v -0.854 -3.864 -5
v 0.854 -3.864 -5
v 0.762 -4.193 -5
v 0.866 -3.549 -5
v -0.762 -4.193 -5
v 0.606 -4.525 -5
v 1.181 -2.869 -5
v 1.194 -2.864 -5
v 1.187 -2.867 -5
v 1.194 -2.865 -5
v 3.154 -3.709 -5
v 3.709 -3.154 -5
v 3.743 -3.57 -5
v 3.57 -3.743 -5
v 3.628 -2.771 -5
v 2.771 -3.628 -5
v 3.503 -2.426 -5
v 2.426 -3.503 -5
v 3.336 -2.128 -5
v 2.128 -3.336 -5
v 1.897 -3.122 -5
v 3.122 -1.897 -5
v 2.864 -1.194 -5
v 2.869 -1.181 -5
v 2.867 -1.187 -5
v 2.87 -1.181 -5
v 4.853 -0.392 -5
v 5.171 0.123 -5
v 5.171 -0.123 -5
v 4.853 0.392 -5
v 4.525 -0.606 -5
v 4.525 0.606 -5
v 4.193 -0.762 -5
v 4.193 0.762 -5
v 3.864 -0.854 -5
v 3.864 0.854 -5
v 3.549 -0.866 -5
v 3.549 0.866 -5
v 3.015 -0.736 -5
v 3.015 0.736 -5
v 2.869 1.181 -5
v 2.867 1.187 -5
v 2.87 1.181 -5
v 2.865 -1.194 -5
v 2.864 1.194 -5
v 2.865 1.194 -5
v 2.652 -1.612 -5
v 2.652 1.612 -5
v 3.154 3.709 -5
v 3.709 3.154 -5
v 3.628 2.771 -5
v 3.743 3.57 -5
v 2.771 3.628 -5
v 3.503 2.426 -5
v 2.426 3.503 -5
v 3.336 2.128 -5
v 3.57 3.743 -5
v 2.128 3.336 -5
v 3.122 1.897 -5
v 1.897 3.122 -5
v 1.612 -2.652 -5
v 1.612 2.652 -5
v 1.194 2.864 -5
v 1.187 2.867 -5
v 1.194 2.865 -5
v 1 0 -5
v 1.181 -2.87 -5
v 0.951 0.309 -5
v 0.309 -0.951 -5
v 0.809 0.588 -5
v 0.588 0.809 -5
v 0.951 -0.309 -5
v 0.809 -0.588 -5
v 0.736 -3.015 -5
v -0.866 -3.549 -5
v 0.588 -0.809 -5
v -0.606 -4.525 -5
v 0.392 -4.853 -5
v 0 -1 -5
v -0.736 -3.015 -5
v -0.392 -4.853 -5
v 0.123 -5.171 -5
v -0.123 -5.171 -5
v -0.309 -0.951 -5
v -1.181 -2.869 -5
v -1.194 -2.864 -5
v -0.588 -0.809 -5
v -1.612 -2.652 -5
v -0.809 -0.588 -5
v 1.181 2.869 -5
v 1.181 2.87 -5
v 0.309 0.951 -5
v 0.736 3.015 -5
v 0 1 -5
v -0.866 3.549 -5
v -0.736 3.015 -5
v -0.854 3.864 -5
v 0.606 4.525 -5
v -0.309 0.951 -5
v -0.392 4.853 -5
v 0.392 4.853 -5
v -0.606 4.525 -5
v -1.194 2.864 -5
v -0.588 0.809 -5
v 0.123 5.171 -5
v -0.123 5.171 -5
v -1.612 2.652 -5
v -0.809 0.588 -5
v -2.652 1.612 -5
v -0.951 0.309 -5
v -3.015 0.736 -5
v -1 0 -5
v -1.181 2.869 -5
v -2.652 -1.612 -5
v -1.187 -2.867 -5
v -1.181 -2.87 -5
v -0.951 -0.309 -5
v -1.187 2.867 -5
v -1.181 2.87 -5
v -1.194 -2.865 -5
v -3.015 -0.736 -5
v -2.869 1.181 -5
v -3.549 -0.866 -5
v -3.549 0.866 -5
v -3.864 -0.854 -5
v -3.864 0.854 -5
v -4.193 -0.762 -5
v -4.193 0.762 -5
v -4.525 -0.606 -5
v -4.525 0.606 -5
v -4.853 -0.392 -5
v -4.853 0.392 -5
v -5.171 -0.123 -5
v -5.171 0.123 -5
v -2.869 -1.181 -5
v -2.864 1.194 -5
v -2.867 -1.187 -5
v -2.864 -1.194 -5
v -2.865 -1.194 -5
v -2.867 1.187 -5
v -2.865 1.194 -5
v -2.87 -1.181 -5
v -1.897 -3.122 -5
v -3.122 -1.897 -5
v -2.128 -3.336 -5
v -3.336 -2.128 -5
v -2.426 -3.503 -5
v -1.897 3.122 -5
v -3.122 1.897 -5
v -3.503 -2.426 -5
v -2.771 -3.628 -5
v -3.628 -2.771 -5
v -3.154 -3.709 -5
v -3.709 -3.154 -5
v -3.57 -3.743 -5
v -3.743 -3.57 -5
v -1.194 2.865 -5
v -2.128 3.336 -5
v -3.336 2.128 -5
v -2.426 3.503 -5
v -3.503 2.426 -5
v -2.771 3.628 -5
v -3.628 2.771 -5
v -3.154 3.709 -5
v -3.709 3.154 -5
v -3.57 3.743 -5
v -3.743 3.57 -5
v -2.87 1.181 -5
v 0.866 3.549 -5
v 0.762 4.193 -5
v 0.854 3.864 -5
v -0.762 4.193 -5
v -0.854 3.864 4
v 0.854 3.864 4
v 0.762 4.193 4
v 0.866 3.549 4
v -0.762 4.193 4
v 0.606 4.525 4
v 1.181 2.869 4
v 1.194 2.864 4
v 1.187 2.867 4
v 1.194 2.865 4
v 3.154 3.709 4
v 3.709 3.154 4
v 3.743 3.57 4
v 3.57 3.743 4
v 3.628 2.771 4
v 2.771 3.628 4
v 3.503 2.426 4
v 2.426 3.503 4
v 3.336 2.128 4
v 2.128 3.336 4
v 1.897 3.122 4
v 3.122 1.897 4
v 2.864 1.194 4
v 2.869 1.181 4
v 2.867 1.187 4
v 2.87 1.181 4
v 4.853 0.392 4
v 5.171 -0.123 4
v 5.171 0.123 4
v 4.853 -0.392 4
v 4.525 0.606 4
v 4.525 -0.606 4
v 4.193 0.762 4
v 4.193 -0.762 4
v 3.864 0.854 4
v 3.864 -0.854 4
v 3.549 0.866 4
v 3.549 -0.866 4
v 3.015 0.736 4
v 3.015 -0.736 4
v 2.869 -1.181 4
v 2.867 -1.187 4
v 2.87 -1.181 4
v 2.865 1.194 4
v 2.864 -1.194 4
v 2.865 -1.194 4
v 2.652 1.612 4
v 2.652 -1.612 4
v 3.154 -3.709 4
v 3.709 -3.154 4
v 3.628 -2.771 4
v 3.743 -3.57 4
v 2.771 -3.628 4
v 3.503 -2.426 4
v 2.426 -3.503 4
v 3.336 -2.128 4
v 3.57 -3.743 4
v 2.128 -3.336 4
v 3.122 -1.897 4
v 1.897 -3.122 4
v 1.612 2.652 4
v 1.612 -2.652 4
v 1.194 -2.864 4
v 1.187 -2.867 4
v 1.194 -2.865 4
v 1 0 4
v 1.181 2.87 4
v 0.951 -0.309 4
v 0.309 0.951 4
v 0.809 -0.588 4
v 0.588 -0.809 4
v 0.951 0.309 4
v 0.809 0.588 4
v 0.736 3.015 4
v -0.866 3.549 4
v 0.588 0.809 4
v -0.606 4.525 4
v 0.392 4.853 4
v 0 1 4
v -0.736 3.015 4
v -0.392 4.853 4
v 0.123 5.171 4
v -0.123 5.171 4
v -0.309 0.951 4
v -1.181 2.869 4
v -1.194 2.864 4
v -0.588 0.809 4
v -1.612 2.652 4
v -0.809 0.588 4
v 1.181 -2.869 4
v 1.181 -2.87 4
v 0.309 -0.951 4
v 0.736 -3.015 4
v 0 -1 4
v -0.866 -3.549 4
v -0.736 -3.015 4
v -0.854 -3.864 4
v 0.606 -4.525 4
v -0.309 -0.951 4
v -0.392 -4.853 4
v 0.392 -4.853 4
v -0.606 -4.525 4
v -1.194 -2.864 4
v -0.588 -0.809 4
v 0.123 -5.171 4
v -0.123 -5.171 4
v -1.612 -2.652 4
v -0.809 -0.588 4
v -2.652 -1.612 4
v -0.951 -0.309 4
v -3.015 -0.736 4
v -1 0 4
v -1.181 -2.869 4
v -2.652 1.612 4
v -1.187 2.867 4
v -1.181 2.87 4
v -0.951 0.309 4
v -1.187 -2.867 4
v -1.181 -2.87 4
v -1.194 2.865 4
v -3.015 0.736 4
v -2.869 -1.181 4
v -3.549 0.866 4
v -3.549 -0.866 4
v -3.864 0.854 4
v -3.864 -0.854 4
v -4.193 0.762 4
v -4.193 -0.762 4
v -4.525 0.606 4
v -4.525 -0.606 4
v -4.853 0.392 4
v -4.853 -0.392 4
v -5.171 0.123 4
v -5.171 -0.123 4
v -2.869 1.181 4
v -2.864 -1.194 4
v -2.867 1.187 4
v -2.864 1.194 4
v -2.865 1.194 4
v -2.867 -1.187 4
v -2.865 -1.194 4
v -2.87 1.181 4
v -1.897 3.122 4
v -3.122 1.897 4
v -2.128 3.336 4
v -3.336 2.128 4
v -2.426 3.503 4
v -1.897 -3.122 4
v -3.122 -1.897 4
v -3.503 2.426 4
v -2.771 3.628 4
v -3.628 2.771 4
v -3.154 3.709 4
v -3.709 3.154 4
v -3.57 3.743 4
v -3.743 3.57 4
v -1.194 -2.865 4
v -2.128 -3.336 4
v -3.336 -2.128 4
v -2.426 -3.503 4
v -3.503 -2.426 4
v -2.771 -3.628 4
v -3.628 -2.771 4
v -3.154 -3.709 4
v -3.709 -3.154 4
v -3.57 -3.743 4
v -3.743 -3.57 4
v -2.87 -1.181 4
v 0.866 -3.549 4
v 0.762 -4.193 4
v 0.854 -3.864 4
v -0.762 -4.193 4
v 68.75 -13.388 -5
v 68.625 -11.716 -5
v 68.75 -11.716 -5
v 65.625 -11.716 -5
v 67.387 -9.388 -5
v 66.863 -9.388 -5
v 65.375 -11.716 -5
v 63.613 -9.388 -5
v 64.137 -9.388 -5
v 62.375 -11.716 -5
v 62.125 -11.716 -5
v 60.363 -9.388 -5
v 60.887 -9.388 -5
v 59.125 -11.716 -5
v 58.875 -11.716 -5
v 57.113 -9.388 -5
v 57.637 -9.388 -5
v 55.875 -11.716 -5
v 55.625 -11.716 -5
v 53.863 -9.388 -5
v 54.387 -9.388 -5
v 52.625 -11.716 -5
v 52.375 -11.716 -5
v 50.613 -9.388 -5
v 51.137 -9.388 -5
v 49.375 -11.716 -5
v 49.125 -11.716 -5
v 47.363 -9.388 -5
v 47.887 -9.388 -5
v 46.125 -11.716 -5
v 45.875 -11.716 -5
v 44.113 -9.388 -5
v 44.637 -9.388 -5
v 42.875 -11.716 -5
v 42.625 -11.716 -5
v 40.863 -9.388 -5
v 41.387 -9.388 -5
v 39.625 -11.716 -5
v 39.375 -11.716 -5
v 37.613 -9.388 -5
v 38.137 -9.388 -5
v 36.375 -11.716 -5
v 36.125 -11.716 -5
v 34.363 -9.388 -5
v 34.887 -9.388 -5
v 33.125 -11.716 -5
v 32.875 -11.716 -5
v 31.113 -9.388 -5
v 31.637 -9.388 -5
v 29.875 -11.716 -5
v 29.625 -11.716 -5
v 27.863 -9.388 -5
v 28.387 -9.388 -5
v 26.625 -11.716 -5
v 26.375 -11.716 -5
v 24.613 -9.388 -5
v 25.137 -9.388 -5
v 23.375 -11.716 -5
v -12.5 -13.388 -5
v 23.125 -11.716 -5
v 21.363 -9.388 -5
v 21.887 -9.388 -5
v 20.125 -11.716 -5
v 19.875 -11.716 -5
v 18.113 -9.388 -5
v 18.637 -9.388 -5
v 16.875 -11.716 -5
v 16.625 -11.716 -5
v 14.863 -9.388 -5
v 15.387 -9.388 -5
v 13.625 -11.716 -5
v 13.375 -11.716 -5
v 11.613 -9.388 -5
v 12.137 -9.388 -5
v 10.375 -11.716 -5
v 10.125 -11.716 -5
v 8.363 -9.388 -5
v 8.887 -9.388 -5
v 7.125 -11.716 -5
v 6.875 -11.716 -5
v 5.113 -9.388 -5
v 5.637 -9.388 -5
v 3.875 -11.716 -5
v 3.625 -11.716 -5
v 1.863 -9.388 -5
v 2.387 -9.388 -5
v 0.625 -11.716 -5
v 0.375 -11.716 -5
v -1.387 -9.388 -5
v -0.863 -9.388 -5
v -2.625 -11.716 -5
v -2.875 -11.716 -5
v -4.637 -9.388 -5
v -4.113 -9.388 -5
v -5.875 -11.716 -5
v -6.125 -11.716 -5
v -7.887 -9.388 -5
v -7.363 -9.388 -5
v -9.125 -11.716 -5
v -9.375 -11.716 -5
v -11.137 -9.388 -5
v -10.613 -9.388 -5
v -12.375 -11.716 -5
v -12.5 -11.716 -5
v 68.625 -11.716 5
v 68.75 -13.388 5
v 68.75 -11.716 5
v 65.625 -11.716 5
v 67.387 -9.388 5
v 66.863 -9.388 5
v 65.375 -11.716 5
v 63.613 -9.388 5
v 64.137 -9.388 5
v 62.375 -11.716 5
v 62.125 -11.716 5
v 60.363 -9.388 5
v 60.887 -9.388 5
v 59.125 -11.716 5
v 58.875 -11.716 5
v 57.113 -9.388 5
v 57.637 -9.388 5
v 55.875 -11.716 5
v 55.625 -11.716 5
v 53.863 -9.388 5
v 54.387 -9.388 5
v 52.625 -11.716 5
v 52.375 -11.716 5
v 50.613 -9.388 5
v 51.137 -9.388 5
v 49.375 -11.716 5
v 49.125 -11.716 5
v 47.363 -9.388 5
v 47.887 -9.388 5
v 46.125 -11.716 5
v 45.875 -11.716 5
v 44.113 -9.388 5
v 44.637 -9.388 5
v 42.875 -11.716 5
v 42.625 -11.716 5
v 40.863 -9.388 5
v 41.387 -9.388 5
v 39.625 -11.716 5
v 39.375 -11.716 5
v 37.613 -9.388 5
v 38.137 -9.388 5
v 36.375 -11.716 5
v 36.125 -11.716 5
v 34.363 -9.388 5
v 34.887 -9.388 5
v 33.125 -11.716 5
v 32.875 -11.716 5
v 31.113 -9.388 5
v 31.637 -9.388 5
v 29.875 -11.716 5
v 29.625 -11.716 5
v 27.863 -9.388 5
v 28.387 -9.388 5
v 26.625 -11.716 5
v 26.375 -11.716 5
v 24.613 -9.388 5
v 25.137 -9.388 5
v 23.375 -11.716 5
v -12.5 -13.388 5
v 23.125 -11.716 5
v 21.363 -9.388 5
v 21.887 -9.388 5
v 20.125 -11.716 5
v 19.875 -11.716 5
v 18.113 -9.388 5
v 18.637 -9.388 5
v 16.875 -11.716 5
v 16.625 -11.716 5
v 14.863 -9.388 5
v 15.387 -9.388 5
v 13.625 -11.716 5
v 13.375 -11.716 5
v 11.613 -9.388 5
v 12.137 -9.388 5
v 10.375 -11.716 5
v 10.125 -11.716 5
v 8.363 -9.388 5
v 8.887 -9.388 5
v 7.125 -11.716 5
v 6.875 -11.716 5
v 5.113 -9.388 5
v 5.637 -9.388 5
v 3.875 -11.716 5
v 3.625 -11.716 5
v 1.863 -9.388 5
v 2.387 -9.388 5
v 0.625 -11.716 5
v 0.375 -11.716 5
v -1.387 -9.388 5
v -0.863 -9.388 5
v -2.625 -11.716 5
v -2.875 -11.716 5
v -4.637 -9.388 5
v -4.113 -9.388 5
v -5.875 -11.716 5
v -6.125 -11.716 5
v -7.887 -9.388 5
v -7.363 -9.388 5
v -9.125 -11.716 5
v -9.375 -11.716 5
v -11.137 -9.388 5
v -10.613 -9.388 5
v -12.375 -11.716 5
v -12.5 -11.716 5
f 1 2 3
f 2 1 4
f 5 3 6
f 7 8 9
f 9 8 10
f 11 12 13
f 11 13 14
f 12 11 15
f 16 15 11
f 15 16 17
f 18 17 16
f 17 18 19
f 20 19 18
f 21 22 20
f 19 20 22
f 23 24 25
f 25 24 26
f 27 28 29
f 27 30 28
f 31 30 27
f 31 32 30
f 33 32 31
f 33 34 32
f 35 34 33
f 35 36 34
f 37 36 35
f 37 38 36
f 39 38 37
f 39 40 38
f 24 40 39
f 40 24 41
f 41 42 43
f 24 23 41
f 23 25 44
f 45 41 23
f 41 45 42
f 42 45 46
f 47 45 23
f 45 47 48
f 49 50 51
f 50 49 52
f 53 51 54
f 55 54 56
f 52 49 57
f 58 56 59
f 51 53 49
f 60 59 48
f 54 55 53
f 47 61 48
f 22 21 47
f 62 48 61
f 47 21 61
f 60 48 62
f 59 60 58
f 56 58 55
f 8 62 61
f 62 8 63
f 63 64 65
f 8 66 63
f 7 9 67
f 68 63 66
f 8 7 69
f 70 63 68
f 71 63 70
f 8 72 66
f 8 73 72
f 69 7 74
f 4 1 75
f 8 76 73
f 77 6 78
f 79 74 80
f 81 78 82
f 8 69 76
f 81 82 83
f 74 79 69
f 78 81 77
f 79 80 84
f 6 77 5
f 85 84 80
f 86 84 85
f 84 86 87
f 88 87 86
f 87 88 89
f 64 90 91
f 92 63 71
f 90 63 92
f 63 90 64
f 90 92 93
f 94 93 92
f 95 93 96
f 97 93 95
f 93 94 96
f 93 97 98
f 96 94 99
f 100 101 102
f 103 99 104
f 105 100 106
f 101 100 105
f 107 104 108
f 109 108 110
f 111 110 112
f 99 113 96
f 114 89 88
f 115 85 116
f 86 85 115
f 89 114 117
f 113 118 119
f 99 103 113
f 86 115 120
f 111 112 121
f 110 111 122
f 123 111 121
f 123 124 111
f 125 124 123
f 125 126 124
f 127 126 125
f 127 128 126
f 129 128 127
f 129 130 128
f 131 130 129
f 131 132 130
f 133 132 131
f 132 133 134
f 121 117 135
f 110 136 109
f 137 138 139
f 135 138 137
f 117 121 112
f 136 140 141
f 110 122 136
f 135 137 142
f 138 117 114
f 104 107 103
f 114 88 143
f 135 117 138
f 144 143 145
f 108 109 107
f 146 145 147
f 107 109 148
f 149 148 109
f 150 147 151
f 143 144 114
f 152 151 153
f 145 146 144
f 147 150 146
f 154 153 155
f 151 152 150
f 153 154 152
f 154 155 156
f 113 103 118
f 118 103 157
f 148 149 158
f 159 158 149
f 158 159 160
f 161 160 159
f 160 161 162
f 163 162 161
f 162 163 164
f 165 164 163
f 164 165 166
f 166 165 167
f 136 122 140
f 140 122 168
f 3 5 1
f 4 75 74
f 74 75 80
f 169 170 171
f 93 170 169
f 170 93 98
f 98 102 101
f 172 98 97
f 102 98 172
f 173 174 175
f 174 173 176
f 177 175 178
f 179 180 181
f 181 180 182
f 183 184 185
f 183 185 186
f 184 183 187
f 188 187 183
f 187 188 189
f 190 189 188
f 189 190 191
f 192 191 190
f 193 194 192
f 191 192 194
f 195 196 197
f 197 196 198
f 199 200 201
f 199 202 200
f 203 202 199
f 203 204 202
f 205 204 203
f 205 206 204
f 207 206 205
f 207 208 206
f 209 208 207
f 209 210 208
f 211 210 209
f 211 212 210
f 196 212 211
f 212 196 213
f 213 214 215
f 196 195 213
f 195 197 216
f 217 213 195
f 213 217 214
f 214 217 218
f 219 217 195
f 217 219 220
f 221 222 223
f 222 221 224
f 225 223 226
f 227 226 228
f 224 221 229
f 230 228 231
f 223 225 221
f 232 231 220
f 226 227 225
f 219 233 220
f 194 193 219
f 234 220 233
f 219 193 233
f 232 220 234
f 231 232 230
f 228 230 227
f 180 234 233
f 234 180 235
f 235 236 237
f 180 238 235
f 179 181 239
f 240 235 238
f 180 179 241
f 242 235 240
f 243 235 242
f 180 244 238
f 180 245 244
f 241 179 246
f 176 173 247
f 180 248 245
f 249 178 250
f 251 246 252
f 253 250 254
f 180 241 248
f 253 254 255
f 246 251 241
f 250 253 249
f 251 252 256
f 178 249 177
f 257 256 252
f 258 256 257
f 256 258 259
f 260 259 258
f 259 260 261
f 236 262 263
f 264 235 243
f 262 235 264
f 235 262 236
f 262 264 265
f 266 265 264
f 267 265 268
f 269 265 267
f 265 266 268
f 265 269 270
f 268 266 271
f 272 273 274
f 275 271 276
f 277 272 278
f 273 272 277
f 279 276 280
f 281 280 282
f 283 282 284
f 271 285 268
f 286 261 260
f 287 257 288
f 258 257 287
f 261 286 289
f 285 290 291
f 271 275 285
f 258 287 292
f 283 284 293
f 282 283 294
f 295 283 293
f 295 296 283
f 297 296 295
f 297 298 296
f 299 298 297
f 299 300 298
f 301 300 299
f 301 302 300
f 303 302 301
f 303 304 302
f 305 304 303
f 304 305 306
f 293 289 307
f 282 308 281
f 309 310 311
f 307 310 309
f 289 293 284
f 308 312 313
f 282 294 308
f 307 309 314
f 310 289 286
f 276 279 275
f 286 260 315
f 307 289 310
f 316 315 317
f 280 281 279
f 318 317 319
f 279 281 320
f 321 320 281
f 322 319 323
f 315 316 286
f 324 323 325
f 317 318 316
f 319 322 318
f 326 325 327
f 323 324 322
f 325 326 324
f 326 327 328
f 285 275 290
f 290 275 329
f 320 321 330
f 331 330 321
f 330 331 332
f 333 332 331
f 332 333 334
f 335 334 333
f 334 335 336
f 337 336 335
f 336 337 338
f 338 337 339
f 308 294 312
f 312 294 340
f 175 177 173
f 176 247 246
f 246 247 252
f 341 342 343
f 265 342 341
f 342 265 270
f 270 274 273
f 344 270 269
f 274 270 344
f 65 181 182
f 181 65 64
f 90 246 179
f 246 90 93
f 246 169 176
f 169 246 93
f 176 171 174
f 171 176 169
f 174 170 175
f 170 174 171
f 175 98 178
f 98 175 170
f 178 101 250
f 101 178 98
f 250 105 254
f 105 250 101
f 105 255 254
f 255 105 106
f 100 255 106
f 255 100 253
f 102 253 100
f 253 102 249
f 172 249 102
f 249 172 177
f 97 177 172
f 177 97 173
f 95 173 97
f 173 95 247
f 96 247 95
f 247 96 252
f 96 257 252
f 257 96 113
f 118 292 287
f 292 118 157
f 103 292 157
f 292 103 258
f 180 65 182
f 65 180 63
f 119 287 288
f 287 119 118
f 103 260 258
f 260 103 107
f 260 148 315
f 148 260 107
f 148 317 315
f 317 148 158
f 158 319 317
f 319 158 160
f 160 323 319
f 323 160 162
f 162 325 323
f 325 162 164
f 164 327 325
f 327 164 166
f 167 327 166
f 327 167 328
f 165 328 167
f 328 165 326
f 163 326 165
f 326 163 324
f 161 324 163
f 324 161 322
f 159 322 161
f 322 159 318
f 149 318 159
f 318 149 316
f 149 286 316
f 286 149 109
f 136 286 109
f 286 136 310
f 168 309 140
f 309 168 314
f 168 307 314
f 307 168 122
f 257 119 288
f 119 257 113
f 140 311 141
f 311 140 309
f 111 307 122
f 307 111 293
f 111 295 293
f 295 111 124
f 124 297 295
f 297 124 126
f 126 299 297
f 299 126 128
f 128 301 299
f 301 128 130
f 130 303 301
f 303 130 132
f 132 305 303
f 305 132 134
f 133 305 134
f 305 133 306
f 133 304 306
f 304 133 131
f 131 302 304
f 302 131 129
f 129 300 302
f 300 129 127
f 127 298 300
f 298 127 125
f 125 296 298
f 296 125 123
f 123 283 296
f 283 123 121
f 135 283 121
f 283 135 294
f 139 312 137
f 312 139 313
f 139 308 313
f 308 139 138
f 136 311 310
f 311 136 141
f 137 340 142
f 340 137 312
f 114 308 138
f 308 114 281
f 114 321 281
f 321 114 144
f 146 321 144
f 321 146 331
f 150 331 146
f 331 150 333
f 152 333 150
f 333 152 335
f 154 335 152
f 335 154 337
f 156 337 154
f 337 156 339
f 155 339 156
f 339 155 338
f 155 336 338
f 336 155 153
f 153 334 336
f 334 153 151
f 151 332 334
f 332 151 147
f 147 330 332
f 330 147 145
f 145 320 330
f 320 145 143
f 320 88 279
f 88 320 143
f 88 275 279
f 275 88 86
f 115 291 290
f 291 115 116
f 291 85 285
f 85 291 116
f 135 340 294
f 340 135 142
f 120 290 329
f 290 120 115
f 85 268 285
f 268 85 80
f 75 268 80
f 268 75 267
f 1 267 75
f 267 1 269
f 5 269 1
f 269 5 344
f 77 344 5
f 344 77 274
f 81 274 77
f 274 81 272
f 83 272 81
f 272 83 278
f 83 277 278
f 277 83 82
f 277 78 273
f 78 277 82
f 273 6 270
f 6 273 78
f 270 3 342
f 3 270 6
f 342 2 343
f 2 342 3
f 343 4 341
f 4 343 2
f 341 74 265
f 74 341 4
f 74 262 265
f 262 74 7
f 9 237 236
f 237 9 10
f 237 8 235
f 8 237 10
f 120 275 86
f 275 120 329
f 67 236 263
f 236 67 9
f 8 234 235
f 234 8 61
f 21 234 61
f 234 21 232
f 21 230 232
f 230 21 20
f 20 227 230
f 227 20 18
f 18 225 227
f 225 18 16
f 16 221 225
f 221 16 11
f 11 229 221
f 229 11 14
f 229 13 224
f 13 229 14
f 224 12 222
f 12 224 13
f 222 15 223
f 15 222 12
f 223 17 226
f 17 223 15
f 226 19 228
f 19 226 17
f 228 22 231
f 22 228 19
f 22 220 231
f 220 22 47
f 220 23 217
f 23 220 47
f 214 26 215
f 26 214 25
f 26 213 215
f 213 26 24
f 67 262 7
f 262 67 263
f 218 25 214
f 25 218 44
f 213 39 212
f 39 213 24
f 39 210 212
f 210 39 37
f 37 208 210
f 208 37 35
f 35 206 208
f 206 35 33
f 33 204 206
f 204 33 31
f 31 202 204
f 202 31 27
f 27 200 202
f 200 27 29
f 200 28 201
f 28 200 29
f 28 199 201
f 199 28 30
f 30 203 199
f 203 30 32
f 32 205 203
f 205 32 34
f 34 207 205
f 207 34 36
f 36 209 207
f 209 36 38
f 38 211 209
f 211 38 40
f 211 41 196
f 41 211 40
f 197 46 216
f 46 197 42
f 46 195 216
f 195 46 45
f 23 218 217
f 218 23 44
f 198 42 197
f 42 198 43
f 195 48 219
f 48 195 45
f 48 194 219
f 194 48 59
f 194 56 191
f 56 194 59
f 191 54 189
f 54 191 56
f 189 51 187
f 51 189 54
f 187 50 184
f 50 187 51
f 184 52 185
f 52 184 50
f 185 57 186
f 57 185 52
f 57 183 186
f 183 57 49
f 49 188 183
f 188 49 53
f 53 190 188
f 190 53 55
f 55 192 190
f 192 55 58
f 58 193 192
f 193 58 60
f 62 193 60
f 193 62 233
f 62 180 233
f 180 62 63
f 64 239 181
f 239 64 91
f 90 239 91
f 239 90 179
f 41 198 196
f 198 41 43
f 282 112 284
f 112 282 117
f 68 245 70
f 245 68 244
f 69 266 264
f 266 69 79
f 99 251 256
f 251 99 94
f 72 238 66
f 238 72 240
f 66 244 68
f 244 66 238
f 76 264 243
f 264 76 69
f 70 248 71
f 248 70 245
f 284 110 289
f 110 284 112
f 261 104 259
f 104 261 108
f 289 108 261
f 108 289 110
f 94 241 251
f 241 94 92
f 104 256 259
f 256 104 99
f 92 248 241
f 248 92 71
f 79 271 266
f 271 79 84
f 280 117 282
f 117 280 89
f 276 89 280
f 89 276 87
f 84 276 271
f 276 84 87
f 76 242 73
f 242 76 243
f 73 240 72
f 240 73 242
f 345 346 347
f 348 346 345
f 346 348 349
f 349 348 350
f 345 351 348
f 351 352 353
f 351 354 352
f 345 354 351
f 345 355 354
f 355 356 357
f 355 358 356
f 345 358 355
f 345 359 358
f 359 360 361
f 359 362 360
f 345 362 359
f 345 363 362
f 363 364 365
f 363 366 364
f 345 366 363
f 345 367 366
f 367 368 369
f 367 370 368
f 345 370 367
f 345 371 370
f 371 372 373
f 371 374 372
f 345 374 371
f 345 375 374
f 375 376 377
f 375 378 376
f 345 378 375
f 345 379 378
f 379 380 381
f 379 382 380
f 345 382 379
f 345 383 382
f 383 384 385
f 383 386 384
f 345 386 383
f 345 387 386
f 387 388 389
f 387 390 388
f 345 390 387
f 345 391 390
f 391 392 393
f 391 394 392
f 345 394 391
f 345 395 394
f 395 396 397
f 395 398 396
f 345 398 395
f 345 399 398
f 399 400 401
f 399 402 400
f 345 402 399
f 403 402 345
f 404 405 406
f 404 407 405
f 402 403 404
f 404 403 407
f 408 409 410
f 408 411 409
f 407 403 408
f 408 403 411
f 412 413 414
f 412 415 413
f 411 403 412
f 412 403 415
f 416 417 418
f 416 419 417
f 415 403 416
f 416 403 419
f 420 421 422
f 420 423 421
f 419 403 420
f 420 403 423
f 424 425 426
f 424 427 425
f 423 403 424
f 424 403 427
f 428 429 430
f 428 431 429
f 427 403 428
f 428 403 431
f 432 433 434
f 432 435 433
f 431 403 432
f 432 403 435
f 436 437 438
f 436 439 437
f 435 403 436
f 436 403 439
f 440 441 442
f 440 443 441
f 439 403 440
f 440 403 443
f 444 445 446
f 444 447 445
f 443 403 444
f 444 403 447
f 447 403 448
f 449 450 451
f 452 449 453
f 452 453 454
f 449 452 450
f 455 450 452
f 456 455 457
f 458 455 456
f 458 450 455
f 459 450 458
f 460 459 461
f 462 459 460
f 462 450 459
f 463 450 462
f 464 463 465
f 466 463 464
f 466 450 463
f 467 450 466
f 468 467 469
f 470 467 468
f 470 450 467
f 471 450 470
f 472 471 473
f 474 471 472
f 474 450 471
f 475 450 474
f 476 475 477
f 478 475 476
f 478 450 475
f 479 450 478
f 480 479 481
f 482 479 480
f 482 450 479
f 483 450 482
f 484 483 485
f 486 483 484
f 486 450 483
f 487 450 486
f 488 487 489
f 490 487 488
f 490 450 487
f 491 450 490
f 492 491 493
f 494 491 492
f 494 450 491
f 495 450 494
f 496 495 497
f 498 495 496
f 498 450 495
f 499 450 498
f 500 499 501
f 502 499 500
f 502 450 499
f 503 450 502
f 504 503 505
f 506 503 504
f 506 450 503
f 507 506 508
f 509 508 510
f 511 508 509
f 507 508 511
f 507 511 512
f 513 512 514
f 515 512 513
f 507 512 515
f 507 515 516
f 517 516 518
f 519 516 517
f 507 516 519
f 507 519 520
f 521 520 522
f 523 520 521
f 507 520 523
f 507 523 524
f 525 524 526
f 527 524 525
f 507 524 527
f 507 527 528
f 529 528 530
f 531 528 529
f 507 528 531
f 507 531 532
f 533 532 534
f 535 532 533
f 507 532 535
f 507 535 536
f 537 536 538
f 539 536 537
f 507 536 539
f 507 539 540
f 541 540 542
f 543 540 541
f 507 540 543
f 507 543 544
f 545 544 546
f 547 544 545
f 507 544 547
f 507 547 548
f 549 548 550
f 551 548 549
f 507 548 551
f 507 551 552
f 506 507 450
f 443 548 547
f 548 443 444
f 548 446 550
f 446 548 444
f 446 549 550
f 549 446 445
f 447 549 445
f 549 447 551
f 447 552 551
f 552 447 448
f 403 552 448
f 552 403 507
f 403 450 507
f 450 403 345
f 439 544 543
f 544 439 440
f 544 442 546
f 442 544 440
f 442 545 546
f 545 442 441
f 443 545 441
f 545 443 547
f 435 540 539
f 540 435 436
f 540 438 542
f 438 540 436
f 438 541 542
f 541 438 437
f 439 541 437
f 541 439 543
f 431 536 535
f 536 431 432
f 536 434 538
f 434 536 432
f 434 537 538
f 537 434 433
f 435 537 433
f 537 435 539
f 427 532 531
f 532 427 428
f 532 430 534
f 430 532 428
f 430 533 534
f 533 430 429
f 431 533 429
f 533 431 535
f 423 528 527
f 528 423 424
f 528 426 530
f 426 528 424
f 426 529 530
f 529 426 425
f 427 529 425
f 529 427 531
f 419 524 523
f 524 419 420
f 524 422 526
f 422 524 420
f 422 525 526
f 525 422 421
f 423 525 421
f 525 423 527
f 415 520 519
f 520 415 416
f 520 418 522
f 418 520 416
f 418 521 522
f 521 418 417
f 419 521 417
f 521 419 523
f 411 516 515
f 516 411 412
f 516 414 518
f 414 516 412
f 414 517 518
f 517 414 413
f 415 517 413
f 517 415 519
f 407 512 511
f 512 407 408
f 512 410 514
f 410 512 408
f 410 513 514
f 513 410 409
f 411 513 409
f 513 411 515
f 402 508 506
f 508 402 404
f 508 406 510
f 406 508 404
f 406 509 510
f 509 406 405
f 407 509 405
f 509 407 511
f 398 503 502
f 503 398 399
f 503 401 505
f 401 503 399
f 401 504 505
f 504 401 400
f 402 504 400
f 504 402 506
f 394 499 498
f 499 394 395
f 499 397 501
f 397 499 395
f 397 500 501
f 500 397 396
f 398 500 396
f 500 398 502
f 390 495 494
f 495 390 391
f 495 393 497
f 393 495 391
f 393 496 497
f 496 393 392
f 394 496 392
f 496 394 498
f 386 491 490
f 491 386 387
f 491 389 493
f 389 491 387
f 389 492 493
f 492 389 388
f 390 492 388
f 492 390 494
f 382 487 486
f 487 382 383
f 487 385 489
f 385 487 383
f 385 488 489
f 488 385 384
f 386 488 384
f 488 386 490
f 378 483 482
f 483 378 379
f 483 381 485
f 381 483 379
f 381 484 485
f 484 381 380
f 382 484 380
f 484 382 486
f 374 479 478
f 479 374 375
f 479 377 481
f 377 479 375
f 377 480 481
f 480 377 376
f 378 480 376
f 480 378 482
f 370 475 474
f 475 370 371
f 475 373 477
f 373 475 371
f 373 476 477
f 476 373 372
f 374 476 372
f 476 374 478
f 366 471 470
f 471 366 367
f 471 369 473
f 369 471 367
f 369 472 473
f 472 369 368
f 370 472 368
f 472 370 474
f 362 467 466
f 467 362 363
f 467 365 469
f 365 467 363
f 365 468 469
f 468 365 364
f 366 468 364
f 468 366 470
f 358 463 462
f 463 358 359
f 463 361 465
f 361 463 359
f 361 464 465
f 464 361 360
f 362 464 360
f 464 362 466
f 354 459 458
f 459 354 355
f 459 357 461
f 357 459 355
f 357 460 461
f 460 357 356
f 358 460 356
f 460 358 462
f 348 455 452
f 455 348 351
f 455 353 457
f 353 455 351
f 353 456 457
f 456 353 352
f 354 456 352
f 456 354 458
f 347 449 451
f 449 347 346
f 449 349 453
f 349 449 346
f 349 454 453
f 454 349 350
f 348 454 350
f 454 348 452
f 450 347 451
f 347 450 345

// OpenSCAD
//This is a modification of " Public Domain Parametric Involute Spur Gear (and involute helical gear and involute rack)
// by Leemon Baird, 2011, Leemon@Leemon.com
//http://www.thingiverse.com/thing:5505  "

//Modifications by racatack June 2016:
//  -Incorporated 'module InvoluteGear_rack()' from the 11/11/15 comment by quisam2342 in thing:5505 to fix noted problems in rack generation at various tooth sizes
//  -Added a section for an optional 'backboard' that can be used to stiffen an otherwise skinny rack
//  -Added sections for optional Stop Blocks at either or both ends of a rack
//  -Removed extra gears from the example since I only need one pinion. See thing:5505 example section to gain more insight into gear generation.





//////////////////////////////////////////////////////////////////////////////////////////////
// Public Domain Parametric Involute Spur Gear (and involute helical gear and involute rack)
// version 1.1
// by Leemon Baird, 2011, Leemon@Leemon.com
//http://www.thingiverse.com/thing:5505
//
// This file is public domain.  Use it for any purpose, including commercial
// applications.  Attribution would be nice, but is not required.  There is
// no warranty of any kind, including its correctness, usefulness, or safety.
// 
// This is parameterized involute spur (or helical) gear.  It is much simpler and less powerful than
// others on Thingiverse.  But it is public domain.  I implemented it from scratch from the 
// descriptions and equations on Wikipedia and the web, using Mathematica for calculations and testing,
// and I now release it into the public domain.
//
//      http://en.wikipedia.org/wiki/Involute_gear
//      http://en.wikipedia.org/wiki/Gear
//      http://en.wikipedia.org/wiki/List_of_gear_nomenclature
//      http://gtrebaol.free.fr/doc/catia/spur_gear.html
//      http://www.cs.cmu.edu/~rapidproto/mechanisms/chpt7.html
//
// The module gear() gives an involute spur gear, with reasonable defaults for all the parameters.
// Normally, you should just choose the first 4 parameters, and let the rest be default values.
// The module gear() gives a gear in the XY plane, centered on the origin, with one tooth centered on
// the positive Y axis.  The various functions below it take the same parameters, and return various
// measurements for the gear.  The most important is pitch_radius, which tells how far apart to space
// gears that are meshing, and adendum_radius, which gives the size of the region filled by the gear.
// A gear has a "pitch circle", which is an invisible circle that cuts through the middle of each
// tooth (though not the exact center). In order for two gears to mesh, their pitch circles should 
// just touch.  So the distance between their centers should be pitch_radius() for one, plus pitch_radius() 
// for the other, which gives the radii of their pitch circles.
//
// In order for two gears to mesh, they must have the same mm_per_tooth and pressure_angle parameters.  
// mm_per_tooth gives the number of millimeters of arc around the pitch circle covered by one tooth and one
// space between teeth.  The pitch angle controls how flat or bulged the sides of the teeth are.  Common
// values include 14.5 degrees and 20 degrees, and occasionally 25.  Though I've seen 28 recommended for
// plastic gears. Larger numbers bulge out more, giving stronger teeth, so 28 degrees is the default here.
//
// The ratio of number_of_teeth for two meshing gears gives how many times one will make a full 
// revolution when the the other makes one full revolution.  If the two numbers are coprime (i.e. 
// are not both divisible by the same number greater than 1), then every tooth on one gear
// will meet every tooth on the other, for more even wear.  So coprime numbers of teeth are good.
//
// The module rack() gives a rack, which is a bar with teeth.  A rack can mesh with any
// gear that has the same mm_per_tooth and pressure_angle.
//
// Some terminology: 
// The outline of a gear is a smooth circle (the "pitch circle") which has mountains and valleys
// added so it is toothed.  So there is an inner circle (the "root circle") that touches the 
// base of all the teeth, an outer circle that touches the tips of all the teeth,
// and the invisible pitch circle in between them.  There is also a "base circle", which can be smaller than
// all three of the others, which controls the shape of the teeth.  The side of each tooth lies on the path 
// that the end of a string would follow if it were wrapped tightly around the base circle, then slowly unwound.  
// That shape is an "involute", which gives this type of gear its name.
//
//////////////////////////////////////////////////////////////////////////////////////////////

//An involute spur gear, with reasonable defaults for all the parameters.
//Normally, you should just choose the first 4 parameters, and let the rest be default values.
//Meshing gears must match in mm_per_tooth, pressure_angle, and twist,
//and be separated by the sum of their pitch radii, which can be found with pitch_radius().
module pinion_gear (
    mm_per_tooth    = 3,    //this is the "circular pitch", the circumference of the pitch circle divided by the number of teeth
    number_of_teeth = 11,   //total number of teeth around the entire perimeter
    thickness       = 6,    //thickness of gear in mm
    hole_diameter   = 3,    //diameter of the hole in the center, in mm
    twist           = 0,    //teeth rotate this many degrees from bottom of gear to top.  360 makes the gear a screw with each thread going around once
    teeth_to_hide   = 0,    //number of teeth to delete to make this only a fraction of a circle
    pressure_angle  = 28,   //Controls how straight or bulged the tooth sides are. In degrees.
    clearance       = 0.0,  //gap between top of a tooth on one gear and bottom of valley on a meshing gear (in millimeters)
    backlash        = 0.0   //gap between two meshing teeth, in the direction along the circumference of the pitch circle
) {
    assign(pi = 3.1415926)
    assign(p  = mm_per_tooth * number_of_teeth / pi / 2)  //radius of pitch circle
    assign(c  = p + mm_per_tooth / pi - clearance)        //radius of outer circle
    assign(b  = p*cos(pressure_angle))                    //radius of base circle
    assign(r  = p-(c-p)-clearance)                        //radius of root circle
    assign(t  = mm_per_tooth/2-backlash/2)                //tooth thickness at pitch circle
    assign(k  = -iang(b, p) - t/2/p/pi*180) {             //angle to where involute meets base circle on each side of tooth
        difference() {
            for (i = [0:number_of_teeth-teeth_to_hide-1] )
                rotate([0,0,i*360/number_of_teeth])
                    linear_extrude(height = thickness, center = true, convexity = 10, twist = twist)
                        polygon(
                            points=[
                                [0, -hole_diameter/10],
                                polar(r, -181/number_of_teeth),
                                polar(r, r<b ? k : -180/number_of_teeth),
                                q7(0/5,r,b,c,k, 1),q7(1/5,r,b,c,k, 1),q7(2/5,r,b,c,k, 1),q7(3/5,r,b,c,k, 1),q7(4/5,r,b,c,k, 1),q7(5/5,r,b,c,k, 1),
                                q7(5/5,r,b,c,k,-1),q7(4/5,r,b,c,k,-1),q7(3/5,r,b,c,k,-1),q7(2/5,r,b,c,k,-1),q7(1/5,r,b,c,k,-1),q7(0/5,r,b,c,k,-1),
                                polar(r, r<b ? -k : 180/number_of_teeth),
                                polar(r, 181/number_of_teeth)
                            ],
                            paths=[[0,1,2,3,4,5,6,7,8,9,10,11,12,13,14,15,16]]
                        );
            if(hole_diameter)
            cylinder(h=2*thickness+1, r=hole_diameter/2, center=true, $fn=20);
        }
    }
};  
//these 4 functions are used by gear
function polar(r,theta)   = r*[sin(theta), cos(theta)];                            //convert polar to cartesian coordinates
function iang(r1,r2)      = sqrt((r2/r1)*(r2/r1) - 1)/3.1415926*180 - acos(r1/r2); //unwind a string this many degrees to go from radius r1 to radius r2
function q7(f,r,b,r2,t,s) = q6(b,s,t,(1-f)*max(b,r)+f*r2);                         //radius a fraction f up the curved side of the tooth 
function q6(b,s,t,d)      = polar(d,s*(iang(b,d)+t));                              //point at radius d on the involute curve

//a rack, which is a straight line with teeth (the same as a segment from a giant gear with a huge number of teeth).
//The "pitch circle" is a line along the X axis.
//module rack (
//  mm_per_tooth    = 3,    //this is the "circular pitch", the circumference of the pitch circle divided by the number //of teeth
//  number_of_teeth = 11,   //total number of teeth along the rack
//  thickness       = 6,    //thickness of rack in mm (affects each tooth)
//  height          = 120,   //height of rack in mm, from tooth top to far side of rack.
//  pressure_angle  = 28,   //Controls how straight or bulged the tooth sides are. In degrees.
//  backlash        = 0.0   //gap between two meshing teeth, in the direction along the circumference of the pitch circle
//) {
//  assign(pi = 3.1415926)
//  assign(a = mm_per_tooth / pi) //addendum
//  assign(t = a*cos(pressure_angle)-1)         //tooth side is tilted so top/bottom corners move this amount
//      for (i = [0:number_of_teeth-1] )
//          translate([i*mm_per_tooth,0,0])
//              linear_extrude(height = thickness, center = true, convexity = 10)
//                  polygon(
//                      points=[
//                          [-mm_per_tooth * 3/4,                 a-height],
//                          [-mm_per_tooth * 3/4 - backlash,     -a],
//                          [-mm_per_tooth * 1/4 + backlash - t, -a],
//                          [-mm_per_tooth * 1/4 + backlash + t,  a],
//                          [ mm_per_tooth * 1/4 - backlash - t,  a],
//                          [ mm_per_tooth * 1/4 - backlash + t, -a],
//                          [ mm_per_tooth * 3/4 + backlash,     -a],
//                          [ mm_per_tooth * 3/4,                 a-height],
//                      ],
//                      paths=[[0,1,2,3,4,5,6,7]]
//                  );
//};    


  //rac note - This section generates the rack body and teeth. It is from the 11/11/15 comment by quisam2342 in thing:5505 to fix noted problems with rack generation, and replaces the original 'module rack()'
////////////////////////////////////////////////////////////////////////////////////////////////
// The module InvoluteGear_rack() gives a involute gear rack, which is a bar with teeth.
// A rack can mesh with any gear that has the same mm_per_tooth and pressure_angle.
// The "pitch circle" is a line along the X axis.
//
// mm_per_tooth     this is the "circular pitch", the circumference of the pitch circle
//                  divided by the number of teeth
//
// number_of_teeth  total number of teeth along the rack
//
// thickness        thickness of rack in mm
//
// height           height of rack in mm, from tooth top to far side of rack
//
// pressure_angle   controls how straight or bulged the tooth sides are, in degrees
//
// clearance        gap between top of a tooth on one gear and bottom of valley
//                  on a meshing gear, in millimeters
//
// backlash         gap between two meshing teeth, in the direction along the circumference
//                  of the pitch circle
////////////////////////////////////////////////////////////////////////////////////////////////



module InvoluteGear_rack (
    mm_per_tooth    = 3,   //Default numbers in this section get overridden by numbers in 'example rack and pinion' section, so set your values there.
    number_of_teeth = 11,
    thickness       = 6,
    height          = 4,
    
  //rac - Added variables for backboard and stop blocks: 
 //set your values in the 'example rack and pinion' section, as defaults given here will be overridden by that section 
    backboard_thickness = 2.0,
    backboard_height = 1.0, 
    stop_height = backboard_height, 
    left_stop_enable = 1, 
    right_stop_enable = 1,
    
//These defaults are not redefined in the example section:
    pressure_angle  = 28,  
    clearance       = 0.0,
    backlash        = 0.0

)

{
    // addendum - tooth height above pitch line
    assign(addendum =        module_value(mm_per_tooth) - clearance)

    // dedendum - tooth height below pitch line
    assign(dedendum = 1.25 * module_value(mm_per_tooth)            ) 


    for (i = [0:number_of_teeth-1] )
        translate([(i+0.5)*mm_per_tooth,height-addendum,0])
            linear_extrude(height = thickness, center = true, convexity = 10)  //'height' parameter here is not the same as 'height' parameter of module
                polygon(
                    points=[
                        [-1/2 * mm_per_tooth,                                              addendum-height],
                        [-1/2 * mm_per_tooth,                                             -dedendum],
                        [-1/4 * mm_per_tooth + backlash - dedendum * tan(pressure_angle), -dedendum],
                        [-1/4 * mm_per_tooth + backlash + addendum * tan(pressure_angle),  addendum],
                        [ 1/4 * mm_per_tooth - backlash - addendum * tan(pressure_angle),  addendum],
                        [ 1/4 * mm_per_tooth - backlash + dedendum * tan(pressure_angle), -dedendum],
                        [ 1/2 * mm_per_tooth,                                             -dedendum],
                        [ 1/2 * mm_per_tooth,                                              addendum-height],
                    ],
                    paths=[[0,1,2,3,4,5,6,7]]
                );


}


//These 5 functions let the user find the derived dimensions of the gear.
//A gear fits within a circle of radius outer_radius, and two gears should have
//their centers separated by the sum of their pictch_radius.
function circular_pitch  (mm_per_tooth=3) = mm_per_tooth;                     //tooth density expressed as "circular pitch" in millimeters
function diametral_pitch (mm_per_tooth=3) = 3.1415926 / mm_per_tooth;         //tooth density expressed as "diametral pitch" in teeth per millimeter
function module_value    (mm_per_tooth=3) = mm_per_tooth / 3.1415926;                //tooth density expressed as "module" or "modulus" in millimeters
function pitch_radius    (mm_per_tooth=3,number_of_teeth=11) = mm_per_tooth * number_of_teeth / 3.1415926 / 2;
function outer_radius    (mm_per_tooth=3,number_of_teeth=11,clearance=0.1)    //The gear fits entirely within a cylinder of this radius.
    = mm_per_tooth*(1+number_of_teeth/2)/3.1415926  - clearance;              

//////////////////////////////////////////////////////////////////////////////////////////////
//example rack and pinion: 
//ENTER YOUR VALUES HERE: (not in InvoluteGear_rack() defaults)

//all distances in mm
n1 = 8; //red gear number of teeth
n5 = 25;  //gray rack number of teeth
mm_per_tooth = 3.25; //all meshing gears need the same mm_per_tooth (and the same pressure_angle)
thickness    = 10;  // depth of the rack, including backboard if any. The pinion will be this depth minus the backboard_thickness
hole         = 2;   //hole diameter in pinion gear
height       = 4;  // distance from bottom of the rack to the tips of the teeth

//rac - Added - Set your values for Backboard and Stop Blocks here 
backboard_thickness = 1.0; //set to zero for no backboard
backboard_height = 2;   //set to zero for top of backboard to be even with tips of teeth, a positive number will extend above the teeth by the chosen amount, vice-versa for negative (use large negative to make a flange on underside of rack)
stop_height = 2; //Stop Blocks will extend this much above the teeth, can be positive or negative
left_stop_enable = 1;  //set to 1 to generate Left Stop Block, set to 0 to disable
right_stop_enable = 1;  //set to 1 to generate Right Stop Block, set to 0 to disable

//end of inputs -------------------------------------------------------

d1 =pitch_radius(mm_per_tooth,n1);

//Generation of pinion gear:
translate([ 0,    0, -.5*backboard_thickness]) rotate([0,0, $t*360/n1])                 color([1.00,0.75,0.75]) pinion_gear(mm_per_tooth,n1,(thickness-backboard_thickness),hole); //rac -RE above: 'thickness-backboard_thickness' is used here to reduce gear thickness for backboard on rack, The '-.5*backboard_thickness' in translate puts gear bottom even with rack bottom

//Generation of rack, and Relative positioning of gear and rack:
translate([(-floor(n5/2)-floor(n1/2)+$t+n1/2-1/2), -height-backboard_height-d1-mm_per_tooth, 0]) rotate([0,0,0]) color([0.75,0.75,0.75]) InvoluteGear_rack(mm_per_tooth,n5,thickness,height,backboard_thickness,backboard_height,stop_height,left_stop_enable,right_stop_enable);   //rac - In the above 'translate' instruction, the middle parameter sets spacing between the rack and the pinion. I've set it to '-height-backboard_height-d1-mm_per_tooth' to give a proportionate offset that allows for ease of printing for most sets of gear & rack parameters. If you use a large negative backboard height the gear and rack may overlap. That can be fixed by substituting some other number/formula for '-height-backboard_height-d1-mm_per_tooth'. Try for example -3*d1, or just subtract an additional fixed offset from what's in there now (e.g. (-height-backboard_height-d1-mm_per_tooth)-14.)

//end of example rack and pinion 
//////////////////////////////////////////////////////////////////////////////////////////////////
